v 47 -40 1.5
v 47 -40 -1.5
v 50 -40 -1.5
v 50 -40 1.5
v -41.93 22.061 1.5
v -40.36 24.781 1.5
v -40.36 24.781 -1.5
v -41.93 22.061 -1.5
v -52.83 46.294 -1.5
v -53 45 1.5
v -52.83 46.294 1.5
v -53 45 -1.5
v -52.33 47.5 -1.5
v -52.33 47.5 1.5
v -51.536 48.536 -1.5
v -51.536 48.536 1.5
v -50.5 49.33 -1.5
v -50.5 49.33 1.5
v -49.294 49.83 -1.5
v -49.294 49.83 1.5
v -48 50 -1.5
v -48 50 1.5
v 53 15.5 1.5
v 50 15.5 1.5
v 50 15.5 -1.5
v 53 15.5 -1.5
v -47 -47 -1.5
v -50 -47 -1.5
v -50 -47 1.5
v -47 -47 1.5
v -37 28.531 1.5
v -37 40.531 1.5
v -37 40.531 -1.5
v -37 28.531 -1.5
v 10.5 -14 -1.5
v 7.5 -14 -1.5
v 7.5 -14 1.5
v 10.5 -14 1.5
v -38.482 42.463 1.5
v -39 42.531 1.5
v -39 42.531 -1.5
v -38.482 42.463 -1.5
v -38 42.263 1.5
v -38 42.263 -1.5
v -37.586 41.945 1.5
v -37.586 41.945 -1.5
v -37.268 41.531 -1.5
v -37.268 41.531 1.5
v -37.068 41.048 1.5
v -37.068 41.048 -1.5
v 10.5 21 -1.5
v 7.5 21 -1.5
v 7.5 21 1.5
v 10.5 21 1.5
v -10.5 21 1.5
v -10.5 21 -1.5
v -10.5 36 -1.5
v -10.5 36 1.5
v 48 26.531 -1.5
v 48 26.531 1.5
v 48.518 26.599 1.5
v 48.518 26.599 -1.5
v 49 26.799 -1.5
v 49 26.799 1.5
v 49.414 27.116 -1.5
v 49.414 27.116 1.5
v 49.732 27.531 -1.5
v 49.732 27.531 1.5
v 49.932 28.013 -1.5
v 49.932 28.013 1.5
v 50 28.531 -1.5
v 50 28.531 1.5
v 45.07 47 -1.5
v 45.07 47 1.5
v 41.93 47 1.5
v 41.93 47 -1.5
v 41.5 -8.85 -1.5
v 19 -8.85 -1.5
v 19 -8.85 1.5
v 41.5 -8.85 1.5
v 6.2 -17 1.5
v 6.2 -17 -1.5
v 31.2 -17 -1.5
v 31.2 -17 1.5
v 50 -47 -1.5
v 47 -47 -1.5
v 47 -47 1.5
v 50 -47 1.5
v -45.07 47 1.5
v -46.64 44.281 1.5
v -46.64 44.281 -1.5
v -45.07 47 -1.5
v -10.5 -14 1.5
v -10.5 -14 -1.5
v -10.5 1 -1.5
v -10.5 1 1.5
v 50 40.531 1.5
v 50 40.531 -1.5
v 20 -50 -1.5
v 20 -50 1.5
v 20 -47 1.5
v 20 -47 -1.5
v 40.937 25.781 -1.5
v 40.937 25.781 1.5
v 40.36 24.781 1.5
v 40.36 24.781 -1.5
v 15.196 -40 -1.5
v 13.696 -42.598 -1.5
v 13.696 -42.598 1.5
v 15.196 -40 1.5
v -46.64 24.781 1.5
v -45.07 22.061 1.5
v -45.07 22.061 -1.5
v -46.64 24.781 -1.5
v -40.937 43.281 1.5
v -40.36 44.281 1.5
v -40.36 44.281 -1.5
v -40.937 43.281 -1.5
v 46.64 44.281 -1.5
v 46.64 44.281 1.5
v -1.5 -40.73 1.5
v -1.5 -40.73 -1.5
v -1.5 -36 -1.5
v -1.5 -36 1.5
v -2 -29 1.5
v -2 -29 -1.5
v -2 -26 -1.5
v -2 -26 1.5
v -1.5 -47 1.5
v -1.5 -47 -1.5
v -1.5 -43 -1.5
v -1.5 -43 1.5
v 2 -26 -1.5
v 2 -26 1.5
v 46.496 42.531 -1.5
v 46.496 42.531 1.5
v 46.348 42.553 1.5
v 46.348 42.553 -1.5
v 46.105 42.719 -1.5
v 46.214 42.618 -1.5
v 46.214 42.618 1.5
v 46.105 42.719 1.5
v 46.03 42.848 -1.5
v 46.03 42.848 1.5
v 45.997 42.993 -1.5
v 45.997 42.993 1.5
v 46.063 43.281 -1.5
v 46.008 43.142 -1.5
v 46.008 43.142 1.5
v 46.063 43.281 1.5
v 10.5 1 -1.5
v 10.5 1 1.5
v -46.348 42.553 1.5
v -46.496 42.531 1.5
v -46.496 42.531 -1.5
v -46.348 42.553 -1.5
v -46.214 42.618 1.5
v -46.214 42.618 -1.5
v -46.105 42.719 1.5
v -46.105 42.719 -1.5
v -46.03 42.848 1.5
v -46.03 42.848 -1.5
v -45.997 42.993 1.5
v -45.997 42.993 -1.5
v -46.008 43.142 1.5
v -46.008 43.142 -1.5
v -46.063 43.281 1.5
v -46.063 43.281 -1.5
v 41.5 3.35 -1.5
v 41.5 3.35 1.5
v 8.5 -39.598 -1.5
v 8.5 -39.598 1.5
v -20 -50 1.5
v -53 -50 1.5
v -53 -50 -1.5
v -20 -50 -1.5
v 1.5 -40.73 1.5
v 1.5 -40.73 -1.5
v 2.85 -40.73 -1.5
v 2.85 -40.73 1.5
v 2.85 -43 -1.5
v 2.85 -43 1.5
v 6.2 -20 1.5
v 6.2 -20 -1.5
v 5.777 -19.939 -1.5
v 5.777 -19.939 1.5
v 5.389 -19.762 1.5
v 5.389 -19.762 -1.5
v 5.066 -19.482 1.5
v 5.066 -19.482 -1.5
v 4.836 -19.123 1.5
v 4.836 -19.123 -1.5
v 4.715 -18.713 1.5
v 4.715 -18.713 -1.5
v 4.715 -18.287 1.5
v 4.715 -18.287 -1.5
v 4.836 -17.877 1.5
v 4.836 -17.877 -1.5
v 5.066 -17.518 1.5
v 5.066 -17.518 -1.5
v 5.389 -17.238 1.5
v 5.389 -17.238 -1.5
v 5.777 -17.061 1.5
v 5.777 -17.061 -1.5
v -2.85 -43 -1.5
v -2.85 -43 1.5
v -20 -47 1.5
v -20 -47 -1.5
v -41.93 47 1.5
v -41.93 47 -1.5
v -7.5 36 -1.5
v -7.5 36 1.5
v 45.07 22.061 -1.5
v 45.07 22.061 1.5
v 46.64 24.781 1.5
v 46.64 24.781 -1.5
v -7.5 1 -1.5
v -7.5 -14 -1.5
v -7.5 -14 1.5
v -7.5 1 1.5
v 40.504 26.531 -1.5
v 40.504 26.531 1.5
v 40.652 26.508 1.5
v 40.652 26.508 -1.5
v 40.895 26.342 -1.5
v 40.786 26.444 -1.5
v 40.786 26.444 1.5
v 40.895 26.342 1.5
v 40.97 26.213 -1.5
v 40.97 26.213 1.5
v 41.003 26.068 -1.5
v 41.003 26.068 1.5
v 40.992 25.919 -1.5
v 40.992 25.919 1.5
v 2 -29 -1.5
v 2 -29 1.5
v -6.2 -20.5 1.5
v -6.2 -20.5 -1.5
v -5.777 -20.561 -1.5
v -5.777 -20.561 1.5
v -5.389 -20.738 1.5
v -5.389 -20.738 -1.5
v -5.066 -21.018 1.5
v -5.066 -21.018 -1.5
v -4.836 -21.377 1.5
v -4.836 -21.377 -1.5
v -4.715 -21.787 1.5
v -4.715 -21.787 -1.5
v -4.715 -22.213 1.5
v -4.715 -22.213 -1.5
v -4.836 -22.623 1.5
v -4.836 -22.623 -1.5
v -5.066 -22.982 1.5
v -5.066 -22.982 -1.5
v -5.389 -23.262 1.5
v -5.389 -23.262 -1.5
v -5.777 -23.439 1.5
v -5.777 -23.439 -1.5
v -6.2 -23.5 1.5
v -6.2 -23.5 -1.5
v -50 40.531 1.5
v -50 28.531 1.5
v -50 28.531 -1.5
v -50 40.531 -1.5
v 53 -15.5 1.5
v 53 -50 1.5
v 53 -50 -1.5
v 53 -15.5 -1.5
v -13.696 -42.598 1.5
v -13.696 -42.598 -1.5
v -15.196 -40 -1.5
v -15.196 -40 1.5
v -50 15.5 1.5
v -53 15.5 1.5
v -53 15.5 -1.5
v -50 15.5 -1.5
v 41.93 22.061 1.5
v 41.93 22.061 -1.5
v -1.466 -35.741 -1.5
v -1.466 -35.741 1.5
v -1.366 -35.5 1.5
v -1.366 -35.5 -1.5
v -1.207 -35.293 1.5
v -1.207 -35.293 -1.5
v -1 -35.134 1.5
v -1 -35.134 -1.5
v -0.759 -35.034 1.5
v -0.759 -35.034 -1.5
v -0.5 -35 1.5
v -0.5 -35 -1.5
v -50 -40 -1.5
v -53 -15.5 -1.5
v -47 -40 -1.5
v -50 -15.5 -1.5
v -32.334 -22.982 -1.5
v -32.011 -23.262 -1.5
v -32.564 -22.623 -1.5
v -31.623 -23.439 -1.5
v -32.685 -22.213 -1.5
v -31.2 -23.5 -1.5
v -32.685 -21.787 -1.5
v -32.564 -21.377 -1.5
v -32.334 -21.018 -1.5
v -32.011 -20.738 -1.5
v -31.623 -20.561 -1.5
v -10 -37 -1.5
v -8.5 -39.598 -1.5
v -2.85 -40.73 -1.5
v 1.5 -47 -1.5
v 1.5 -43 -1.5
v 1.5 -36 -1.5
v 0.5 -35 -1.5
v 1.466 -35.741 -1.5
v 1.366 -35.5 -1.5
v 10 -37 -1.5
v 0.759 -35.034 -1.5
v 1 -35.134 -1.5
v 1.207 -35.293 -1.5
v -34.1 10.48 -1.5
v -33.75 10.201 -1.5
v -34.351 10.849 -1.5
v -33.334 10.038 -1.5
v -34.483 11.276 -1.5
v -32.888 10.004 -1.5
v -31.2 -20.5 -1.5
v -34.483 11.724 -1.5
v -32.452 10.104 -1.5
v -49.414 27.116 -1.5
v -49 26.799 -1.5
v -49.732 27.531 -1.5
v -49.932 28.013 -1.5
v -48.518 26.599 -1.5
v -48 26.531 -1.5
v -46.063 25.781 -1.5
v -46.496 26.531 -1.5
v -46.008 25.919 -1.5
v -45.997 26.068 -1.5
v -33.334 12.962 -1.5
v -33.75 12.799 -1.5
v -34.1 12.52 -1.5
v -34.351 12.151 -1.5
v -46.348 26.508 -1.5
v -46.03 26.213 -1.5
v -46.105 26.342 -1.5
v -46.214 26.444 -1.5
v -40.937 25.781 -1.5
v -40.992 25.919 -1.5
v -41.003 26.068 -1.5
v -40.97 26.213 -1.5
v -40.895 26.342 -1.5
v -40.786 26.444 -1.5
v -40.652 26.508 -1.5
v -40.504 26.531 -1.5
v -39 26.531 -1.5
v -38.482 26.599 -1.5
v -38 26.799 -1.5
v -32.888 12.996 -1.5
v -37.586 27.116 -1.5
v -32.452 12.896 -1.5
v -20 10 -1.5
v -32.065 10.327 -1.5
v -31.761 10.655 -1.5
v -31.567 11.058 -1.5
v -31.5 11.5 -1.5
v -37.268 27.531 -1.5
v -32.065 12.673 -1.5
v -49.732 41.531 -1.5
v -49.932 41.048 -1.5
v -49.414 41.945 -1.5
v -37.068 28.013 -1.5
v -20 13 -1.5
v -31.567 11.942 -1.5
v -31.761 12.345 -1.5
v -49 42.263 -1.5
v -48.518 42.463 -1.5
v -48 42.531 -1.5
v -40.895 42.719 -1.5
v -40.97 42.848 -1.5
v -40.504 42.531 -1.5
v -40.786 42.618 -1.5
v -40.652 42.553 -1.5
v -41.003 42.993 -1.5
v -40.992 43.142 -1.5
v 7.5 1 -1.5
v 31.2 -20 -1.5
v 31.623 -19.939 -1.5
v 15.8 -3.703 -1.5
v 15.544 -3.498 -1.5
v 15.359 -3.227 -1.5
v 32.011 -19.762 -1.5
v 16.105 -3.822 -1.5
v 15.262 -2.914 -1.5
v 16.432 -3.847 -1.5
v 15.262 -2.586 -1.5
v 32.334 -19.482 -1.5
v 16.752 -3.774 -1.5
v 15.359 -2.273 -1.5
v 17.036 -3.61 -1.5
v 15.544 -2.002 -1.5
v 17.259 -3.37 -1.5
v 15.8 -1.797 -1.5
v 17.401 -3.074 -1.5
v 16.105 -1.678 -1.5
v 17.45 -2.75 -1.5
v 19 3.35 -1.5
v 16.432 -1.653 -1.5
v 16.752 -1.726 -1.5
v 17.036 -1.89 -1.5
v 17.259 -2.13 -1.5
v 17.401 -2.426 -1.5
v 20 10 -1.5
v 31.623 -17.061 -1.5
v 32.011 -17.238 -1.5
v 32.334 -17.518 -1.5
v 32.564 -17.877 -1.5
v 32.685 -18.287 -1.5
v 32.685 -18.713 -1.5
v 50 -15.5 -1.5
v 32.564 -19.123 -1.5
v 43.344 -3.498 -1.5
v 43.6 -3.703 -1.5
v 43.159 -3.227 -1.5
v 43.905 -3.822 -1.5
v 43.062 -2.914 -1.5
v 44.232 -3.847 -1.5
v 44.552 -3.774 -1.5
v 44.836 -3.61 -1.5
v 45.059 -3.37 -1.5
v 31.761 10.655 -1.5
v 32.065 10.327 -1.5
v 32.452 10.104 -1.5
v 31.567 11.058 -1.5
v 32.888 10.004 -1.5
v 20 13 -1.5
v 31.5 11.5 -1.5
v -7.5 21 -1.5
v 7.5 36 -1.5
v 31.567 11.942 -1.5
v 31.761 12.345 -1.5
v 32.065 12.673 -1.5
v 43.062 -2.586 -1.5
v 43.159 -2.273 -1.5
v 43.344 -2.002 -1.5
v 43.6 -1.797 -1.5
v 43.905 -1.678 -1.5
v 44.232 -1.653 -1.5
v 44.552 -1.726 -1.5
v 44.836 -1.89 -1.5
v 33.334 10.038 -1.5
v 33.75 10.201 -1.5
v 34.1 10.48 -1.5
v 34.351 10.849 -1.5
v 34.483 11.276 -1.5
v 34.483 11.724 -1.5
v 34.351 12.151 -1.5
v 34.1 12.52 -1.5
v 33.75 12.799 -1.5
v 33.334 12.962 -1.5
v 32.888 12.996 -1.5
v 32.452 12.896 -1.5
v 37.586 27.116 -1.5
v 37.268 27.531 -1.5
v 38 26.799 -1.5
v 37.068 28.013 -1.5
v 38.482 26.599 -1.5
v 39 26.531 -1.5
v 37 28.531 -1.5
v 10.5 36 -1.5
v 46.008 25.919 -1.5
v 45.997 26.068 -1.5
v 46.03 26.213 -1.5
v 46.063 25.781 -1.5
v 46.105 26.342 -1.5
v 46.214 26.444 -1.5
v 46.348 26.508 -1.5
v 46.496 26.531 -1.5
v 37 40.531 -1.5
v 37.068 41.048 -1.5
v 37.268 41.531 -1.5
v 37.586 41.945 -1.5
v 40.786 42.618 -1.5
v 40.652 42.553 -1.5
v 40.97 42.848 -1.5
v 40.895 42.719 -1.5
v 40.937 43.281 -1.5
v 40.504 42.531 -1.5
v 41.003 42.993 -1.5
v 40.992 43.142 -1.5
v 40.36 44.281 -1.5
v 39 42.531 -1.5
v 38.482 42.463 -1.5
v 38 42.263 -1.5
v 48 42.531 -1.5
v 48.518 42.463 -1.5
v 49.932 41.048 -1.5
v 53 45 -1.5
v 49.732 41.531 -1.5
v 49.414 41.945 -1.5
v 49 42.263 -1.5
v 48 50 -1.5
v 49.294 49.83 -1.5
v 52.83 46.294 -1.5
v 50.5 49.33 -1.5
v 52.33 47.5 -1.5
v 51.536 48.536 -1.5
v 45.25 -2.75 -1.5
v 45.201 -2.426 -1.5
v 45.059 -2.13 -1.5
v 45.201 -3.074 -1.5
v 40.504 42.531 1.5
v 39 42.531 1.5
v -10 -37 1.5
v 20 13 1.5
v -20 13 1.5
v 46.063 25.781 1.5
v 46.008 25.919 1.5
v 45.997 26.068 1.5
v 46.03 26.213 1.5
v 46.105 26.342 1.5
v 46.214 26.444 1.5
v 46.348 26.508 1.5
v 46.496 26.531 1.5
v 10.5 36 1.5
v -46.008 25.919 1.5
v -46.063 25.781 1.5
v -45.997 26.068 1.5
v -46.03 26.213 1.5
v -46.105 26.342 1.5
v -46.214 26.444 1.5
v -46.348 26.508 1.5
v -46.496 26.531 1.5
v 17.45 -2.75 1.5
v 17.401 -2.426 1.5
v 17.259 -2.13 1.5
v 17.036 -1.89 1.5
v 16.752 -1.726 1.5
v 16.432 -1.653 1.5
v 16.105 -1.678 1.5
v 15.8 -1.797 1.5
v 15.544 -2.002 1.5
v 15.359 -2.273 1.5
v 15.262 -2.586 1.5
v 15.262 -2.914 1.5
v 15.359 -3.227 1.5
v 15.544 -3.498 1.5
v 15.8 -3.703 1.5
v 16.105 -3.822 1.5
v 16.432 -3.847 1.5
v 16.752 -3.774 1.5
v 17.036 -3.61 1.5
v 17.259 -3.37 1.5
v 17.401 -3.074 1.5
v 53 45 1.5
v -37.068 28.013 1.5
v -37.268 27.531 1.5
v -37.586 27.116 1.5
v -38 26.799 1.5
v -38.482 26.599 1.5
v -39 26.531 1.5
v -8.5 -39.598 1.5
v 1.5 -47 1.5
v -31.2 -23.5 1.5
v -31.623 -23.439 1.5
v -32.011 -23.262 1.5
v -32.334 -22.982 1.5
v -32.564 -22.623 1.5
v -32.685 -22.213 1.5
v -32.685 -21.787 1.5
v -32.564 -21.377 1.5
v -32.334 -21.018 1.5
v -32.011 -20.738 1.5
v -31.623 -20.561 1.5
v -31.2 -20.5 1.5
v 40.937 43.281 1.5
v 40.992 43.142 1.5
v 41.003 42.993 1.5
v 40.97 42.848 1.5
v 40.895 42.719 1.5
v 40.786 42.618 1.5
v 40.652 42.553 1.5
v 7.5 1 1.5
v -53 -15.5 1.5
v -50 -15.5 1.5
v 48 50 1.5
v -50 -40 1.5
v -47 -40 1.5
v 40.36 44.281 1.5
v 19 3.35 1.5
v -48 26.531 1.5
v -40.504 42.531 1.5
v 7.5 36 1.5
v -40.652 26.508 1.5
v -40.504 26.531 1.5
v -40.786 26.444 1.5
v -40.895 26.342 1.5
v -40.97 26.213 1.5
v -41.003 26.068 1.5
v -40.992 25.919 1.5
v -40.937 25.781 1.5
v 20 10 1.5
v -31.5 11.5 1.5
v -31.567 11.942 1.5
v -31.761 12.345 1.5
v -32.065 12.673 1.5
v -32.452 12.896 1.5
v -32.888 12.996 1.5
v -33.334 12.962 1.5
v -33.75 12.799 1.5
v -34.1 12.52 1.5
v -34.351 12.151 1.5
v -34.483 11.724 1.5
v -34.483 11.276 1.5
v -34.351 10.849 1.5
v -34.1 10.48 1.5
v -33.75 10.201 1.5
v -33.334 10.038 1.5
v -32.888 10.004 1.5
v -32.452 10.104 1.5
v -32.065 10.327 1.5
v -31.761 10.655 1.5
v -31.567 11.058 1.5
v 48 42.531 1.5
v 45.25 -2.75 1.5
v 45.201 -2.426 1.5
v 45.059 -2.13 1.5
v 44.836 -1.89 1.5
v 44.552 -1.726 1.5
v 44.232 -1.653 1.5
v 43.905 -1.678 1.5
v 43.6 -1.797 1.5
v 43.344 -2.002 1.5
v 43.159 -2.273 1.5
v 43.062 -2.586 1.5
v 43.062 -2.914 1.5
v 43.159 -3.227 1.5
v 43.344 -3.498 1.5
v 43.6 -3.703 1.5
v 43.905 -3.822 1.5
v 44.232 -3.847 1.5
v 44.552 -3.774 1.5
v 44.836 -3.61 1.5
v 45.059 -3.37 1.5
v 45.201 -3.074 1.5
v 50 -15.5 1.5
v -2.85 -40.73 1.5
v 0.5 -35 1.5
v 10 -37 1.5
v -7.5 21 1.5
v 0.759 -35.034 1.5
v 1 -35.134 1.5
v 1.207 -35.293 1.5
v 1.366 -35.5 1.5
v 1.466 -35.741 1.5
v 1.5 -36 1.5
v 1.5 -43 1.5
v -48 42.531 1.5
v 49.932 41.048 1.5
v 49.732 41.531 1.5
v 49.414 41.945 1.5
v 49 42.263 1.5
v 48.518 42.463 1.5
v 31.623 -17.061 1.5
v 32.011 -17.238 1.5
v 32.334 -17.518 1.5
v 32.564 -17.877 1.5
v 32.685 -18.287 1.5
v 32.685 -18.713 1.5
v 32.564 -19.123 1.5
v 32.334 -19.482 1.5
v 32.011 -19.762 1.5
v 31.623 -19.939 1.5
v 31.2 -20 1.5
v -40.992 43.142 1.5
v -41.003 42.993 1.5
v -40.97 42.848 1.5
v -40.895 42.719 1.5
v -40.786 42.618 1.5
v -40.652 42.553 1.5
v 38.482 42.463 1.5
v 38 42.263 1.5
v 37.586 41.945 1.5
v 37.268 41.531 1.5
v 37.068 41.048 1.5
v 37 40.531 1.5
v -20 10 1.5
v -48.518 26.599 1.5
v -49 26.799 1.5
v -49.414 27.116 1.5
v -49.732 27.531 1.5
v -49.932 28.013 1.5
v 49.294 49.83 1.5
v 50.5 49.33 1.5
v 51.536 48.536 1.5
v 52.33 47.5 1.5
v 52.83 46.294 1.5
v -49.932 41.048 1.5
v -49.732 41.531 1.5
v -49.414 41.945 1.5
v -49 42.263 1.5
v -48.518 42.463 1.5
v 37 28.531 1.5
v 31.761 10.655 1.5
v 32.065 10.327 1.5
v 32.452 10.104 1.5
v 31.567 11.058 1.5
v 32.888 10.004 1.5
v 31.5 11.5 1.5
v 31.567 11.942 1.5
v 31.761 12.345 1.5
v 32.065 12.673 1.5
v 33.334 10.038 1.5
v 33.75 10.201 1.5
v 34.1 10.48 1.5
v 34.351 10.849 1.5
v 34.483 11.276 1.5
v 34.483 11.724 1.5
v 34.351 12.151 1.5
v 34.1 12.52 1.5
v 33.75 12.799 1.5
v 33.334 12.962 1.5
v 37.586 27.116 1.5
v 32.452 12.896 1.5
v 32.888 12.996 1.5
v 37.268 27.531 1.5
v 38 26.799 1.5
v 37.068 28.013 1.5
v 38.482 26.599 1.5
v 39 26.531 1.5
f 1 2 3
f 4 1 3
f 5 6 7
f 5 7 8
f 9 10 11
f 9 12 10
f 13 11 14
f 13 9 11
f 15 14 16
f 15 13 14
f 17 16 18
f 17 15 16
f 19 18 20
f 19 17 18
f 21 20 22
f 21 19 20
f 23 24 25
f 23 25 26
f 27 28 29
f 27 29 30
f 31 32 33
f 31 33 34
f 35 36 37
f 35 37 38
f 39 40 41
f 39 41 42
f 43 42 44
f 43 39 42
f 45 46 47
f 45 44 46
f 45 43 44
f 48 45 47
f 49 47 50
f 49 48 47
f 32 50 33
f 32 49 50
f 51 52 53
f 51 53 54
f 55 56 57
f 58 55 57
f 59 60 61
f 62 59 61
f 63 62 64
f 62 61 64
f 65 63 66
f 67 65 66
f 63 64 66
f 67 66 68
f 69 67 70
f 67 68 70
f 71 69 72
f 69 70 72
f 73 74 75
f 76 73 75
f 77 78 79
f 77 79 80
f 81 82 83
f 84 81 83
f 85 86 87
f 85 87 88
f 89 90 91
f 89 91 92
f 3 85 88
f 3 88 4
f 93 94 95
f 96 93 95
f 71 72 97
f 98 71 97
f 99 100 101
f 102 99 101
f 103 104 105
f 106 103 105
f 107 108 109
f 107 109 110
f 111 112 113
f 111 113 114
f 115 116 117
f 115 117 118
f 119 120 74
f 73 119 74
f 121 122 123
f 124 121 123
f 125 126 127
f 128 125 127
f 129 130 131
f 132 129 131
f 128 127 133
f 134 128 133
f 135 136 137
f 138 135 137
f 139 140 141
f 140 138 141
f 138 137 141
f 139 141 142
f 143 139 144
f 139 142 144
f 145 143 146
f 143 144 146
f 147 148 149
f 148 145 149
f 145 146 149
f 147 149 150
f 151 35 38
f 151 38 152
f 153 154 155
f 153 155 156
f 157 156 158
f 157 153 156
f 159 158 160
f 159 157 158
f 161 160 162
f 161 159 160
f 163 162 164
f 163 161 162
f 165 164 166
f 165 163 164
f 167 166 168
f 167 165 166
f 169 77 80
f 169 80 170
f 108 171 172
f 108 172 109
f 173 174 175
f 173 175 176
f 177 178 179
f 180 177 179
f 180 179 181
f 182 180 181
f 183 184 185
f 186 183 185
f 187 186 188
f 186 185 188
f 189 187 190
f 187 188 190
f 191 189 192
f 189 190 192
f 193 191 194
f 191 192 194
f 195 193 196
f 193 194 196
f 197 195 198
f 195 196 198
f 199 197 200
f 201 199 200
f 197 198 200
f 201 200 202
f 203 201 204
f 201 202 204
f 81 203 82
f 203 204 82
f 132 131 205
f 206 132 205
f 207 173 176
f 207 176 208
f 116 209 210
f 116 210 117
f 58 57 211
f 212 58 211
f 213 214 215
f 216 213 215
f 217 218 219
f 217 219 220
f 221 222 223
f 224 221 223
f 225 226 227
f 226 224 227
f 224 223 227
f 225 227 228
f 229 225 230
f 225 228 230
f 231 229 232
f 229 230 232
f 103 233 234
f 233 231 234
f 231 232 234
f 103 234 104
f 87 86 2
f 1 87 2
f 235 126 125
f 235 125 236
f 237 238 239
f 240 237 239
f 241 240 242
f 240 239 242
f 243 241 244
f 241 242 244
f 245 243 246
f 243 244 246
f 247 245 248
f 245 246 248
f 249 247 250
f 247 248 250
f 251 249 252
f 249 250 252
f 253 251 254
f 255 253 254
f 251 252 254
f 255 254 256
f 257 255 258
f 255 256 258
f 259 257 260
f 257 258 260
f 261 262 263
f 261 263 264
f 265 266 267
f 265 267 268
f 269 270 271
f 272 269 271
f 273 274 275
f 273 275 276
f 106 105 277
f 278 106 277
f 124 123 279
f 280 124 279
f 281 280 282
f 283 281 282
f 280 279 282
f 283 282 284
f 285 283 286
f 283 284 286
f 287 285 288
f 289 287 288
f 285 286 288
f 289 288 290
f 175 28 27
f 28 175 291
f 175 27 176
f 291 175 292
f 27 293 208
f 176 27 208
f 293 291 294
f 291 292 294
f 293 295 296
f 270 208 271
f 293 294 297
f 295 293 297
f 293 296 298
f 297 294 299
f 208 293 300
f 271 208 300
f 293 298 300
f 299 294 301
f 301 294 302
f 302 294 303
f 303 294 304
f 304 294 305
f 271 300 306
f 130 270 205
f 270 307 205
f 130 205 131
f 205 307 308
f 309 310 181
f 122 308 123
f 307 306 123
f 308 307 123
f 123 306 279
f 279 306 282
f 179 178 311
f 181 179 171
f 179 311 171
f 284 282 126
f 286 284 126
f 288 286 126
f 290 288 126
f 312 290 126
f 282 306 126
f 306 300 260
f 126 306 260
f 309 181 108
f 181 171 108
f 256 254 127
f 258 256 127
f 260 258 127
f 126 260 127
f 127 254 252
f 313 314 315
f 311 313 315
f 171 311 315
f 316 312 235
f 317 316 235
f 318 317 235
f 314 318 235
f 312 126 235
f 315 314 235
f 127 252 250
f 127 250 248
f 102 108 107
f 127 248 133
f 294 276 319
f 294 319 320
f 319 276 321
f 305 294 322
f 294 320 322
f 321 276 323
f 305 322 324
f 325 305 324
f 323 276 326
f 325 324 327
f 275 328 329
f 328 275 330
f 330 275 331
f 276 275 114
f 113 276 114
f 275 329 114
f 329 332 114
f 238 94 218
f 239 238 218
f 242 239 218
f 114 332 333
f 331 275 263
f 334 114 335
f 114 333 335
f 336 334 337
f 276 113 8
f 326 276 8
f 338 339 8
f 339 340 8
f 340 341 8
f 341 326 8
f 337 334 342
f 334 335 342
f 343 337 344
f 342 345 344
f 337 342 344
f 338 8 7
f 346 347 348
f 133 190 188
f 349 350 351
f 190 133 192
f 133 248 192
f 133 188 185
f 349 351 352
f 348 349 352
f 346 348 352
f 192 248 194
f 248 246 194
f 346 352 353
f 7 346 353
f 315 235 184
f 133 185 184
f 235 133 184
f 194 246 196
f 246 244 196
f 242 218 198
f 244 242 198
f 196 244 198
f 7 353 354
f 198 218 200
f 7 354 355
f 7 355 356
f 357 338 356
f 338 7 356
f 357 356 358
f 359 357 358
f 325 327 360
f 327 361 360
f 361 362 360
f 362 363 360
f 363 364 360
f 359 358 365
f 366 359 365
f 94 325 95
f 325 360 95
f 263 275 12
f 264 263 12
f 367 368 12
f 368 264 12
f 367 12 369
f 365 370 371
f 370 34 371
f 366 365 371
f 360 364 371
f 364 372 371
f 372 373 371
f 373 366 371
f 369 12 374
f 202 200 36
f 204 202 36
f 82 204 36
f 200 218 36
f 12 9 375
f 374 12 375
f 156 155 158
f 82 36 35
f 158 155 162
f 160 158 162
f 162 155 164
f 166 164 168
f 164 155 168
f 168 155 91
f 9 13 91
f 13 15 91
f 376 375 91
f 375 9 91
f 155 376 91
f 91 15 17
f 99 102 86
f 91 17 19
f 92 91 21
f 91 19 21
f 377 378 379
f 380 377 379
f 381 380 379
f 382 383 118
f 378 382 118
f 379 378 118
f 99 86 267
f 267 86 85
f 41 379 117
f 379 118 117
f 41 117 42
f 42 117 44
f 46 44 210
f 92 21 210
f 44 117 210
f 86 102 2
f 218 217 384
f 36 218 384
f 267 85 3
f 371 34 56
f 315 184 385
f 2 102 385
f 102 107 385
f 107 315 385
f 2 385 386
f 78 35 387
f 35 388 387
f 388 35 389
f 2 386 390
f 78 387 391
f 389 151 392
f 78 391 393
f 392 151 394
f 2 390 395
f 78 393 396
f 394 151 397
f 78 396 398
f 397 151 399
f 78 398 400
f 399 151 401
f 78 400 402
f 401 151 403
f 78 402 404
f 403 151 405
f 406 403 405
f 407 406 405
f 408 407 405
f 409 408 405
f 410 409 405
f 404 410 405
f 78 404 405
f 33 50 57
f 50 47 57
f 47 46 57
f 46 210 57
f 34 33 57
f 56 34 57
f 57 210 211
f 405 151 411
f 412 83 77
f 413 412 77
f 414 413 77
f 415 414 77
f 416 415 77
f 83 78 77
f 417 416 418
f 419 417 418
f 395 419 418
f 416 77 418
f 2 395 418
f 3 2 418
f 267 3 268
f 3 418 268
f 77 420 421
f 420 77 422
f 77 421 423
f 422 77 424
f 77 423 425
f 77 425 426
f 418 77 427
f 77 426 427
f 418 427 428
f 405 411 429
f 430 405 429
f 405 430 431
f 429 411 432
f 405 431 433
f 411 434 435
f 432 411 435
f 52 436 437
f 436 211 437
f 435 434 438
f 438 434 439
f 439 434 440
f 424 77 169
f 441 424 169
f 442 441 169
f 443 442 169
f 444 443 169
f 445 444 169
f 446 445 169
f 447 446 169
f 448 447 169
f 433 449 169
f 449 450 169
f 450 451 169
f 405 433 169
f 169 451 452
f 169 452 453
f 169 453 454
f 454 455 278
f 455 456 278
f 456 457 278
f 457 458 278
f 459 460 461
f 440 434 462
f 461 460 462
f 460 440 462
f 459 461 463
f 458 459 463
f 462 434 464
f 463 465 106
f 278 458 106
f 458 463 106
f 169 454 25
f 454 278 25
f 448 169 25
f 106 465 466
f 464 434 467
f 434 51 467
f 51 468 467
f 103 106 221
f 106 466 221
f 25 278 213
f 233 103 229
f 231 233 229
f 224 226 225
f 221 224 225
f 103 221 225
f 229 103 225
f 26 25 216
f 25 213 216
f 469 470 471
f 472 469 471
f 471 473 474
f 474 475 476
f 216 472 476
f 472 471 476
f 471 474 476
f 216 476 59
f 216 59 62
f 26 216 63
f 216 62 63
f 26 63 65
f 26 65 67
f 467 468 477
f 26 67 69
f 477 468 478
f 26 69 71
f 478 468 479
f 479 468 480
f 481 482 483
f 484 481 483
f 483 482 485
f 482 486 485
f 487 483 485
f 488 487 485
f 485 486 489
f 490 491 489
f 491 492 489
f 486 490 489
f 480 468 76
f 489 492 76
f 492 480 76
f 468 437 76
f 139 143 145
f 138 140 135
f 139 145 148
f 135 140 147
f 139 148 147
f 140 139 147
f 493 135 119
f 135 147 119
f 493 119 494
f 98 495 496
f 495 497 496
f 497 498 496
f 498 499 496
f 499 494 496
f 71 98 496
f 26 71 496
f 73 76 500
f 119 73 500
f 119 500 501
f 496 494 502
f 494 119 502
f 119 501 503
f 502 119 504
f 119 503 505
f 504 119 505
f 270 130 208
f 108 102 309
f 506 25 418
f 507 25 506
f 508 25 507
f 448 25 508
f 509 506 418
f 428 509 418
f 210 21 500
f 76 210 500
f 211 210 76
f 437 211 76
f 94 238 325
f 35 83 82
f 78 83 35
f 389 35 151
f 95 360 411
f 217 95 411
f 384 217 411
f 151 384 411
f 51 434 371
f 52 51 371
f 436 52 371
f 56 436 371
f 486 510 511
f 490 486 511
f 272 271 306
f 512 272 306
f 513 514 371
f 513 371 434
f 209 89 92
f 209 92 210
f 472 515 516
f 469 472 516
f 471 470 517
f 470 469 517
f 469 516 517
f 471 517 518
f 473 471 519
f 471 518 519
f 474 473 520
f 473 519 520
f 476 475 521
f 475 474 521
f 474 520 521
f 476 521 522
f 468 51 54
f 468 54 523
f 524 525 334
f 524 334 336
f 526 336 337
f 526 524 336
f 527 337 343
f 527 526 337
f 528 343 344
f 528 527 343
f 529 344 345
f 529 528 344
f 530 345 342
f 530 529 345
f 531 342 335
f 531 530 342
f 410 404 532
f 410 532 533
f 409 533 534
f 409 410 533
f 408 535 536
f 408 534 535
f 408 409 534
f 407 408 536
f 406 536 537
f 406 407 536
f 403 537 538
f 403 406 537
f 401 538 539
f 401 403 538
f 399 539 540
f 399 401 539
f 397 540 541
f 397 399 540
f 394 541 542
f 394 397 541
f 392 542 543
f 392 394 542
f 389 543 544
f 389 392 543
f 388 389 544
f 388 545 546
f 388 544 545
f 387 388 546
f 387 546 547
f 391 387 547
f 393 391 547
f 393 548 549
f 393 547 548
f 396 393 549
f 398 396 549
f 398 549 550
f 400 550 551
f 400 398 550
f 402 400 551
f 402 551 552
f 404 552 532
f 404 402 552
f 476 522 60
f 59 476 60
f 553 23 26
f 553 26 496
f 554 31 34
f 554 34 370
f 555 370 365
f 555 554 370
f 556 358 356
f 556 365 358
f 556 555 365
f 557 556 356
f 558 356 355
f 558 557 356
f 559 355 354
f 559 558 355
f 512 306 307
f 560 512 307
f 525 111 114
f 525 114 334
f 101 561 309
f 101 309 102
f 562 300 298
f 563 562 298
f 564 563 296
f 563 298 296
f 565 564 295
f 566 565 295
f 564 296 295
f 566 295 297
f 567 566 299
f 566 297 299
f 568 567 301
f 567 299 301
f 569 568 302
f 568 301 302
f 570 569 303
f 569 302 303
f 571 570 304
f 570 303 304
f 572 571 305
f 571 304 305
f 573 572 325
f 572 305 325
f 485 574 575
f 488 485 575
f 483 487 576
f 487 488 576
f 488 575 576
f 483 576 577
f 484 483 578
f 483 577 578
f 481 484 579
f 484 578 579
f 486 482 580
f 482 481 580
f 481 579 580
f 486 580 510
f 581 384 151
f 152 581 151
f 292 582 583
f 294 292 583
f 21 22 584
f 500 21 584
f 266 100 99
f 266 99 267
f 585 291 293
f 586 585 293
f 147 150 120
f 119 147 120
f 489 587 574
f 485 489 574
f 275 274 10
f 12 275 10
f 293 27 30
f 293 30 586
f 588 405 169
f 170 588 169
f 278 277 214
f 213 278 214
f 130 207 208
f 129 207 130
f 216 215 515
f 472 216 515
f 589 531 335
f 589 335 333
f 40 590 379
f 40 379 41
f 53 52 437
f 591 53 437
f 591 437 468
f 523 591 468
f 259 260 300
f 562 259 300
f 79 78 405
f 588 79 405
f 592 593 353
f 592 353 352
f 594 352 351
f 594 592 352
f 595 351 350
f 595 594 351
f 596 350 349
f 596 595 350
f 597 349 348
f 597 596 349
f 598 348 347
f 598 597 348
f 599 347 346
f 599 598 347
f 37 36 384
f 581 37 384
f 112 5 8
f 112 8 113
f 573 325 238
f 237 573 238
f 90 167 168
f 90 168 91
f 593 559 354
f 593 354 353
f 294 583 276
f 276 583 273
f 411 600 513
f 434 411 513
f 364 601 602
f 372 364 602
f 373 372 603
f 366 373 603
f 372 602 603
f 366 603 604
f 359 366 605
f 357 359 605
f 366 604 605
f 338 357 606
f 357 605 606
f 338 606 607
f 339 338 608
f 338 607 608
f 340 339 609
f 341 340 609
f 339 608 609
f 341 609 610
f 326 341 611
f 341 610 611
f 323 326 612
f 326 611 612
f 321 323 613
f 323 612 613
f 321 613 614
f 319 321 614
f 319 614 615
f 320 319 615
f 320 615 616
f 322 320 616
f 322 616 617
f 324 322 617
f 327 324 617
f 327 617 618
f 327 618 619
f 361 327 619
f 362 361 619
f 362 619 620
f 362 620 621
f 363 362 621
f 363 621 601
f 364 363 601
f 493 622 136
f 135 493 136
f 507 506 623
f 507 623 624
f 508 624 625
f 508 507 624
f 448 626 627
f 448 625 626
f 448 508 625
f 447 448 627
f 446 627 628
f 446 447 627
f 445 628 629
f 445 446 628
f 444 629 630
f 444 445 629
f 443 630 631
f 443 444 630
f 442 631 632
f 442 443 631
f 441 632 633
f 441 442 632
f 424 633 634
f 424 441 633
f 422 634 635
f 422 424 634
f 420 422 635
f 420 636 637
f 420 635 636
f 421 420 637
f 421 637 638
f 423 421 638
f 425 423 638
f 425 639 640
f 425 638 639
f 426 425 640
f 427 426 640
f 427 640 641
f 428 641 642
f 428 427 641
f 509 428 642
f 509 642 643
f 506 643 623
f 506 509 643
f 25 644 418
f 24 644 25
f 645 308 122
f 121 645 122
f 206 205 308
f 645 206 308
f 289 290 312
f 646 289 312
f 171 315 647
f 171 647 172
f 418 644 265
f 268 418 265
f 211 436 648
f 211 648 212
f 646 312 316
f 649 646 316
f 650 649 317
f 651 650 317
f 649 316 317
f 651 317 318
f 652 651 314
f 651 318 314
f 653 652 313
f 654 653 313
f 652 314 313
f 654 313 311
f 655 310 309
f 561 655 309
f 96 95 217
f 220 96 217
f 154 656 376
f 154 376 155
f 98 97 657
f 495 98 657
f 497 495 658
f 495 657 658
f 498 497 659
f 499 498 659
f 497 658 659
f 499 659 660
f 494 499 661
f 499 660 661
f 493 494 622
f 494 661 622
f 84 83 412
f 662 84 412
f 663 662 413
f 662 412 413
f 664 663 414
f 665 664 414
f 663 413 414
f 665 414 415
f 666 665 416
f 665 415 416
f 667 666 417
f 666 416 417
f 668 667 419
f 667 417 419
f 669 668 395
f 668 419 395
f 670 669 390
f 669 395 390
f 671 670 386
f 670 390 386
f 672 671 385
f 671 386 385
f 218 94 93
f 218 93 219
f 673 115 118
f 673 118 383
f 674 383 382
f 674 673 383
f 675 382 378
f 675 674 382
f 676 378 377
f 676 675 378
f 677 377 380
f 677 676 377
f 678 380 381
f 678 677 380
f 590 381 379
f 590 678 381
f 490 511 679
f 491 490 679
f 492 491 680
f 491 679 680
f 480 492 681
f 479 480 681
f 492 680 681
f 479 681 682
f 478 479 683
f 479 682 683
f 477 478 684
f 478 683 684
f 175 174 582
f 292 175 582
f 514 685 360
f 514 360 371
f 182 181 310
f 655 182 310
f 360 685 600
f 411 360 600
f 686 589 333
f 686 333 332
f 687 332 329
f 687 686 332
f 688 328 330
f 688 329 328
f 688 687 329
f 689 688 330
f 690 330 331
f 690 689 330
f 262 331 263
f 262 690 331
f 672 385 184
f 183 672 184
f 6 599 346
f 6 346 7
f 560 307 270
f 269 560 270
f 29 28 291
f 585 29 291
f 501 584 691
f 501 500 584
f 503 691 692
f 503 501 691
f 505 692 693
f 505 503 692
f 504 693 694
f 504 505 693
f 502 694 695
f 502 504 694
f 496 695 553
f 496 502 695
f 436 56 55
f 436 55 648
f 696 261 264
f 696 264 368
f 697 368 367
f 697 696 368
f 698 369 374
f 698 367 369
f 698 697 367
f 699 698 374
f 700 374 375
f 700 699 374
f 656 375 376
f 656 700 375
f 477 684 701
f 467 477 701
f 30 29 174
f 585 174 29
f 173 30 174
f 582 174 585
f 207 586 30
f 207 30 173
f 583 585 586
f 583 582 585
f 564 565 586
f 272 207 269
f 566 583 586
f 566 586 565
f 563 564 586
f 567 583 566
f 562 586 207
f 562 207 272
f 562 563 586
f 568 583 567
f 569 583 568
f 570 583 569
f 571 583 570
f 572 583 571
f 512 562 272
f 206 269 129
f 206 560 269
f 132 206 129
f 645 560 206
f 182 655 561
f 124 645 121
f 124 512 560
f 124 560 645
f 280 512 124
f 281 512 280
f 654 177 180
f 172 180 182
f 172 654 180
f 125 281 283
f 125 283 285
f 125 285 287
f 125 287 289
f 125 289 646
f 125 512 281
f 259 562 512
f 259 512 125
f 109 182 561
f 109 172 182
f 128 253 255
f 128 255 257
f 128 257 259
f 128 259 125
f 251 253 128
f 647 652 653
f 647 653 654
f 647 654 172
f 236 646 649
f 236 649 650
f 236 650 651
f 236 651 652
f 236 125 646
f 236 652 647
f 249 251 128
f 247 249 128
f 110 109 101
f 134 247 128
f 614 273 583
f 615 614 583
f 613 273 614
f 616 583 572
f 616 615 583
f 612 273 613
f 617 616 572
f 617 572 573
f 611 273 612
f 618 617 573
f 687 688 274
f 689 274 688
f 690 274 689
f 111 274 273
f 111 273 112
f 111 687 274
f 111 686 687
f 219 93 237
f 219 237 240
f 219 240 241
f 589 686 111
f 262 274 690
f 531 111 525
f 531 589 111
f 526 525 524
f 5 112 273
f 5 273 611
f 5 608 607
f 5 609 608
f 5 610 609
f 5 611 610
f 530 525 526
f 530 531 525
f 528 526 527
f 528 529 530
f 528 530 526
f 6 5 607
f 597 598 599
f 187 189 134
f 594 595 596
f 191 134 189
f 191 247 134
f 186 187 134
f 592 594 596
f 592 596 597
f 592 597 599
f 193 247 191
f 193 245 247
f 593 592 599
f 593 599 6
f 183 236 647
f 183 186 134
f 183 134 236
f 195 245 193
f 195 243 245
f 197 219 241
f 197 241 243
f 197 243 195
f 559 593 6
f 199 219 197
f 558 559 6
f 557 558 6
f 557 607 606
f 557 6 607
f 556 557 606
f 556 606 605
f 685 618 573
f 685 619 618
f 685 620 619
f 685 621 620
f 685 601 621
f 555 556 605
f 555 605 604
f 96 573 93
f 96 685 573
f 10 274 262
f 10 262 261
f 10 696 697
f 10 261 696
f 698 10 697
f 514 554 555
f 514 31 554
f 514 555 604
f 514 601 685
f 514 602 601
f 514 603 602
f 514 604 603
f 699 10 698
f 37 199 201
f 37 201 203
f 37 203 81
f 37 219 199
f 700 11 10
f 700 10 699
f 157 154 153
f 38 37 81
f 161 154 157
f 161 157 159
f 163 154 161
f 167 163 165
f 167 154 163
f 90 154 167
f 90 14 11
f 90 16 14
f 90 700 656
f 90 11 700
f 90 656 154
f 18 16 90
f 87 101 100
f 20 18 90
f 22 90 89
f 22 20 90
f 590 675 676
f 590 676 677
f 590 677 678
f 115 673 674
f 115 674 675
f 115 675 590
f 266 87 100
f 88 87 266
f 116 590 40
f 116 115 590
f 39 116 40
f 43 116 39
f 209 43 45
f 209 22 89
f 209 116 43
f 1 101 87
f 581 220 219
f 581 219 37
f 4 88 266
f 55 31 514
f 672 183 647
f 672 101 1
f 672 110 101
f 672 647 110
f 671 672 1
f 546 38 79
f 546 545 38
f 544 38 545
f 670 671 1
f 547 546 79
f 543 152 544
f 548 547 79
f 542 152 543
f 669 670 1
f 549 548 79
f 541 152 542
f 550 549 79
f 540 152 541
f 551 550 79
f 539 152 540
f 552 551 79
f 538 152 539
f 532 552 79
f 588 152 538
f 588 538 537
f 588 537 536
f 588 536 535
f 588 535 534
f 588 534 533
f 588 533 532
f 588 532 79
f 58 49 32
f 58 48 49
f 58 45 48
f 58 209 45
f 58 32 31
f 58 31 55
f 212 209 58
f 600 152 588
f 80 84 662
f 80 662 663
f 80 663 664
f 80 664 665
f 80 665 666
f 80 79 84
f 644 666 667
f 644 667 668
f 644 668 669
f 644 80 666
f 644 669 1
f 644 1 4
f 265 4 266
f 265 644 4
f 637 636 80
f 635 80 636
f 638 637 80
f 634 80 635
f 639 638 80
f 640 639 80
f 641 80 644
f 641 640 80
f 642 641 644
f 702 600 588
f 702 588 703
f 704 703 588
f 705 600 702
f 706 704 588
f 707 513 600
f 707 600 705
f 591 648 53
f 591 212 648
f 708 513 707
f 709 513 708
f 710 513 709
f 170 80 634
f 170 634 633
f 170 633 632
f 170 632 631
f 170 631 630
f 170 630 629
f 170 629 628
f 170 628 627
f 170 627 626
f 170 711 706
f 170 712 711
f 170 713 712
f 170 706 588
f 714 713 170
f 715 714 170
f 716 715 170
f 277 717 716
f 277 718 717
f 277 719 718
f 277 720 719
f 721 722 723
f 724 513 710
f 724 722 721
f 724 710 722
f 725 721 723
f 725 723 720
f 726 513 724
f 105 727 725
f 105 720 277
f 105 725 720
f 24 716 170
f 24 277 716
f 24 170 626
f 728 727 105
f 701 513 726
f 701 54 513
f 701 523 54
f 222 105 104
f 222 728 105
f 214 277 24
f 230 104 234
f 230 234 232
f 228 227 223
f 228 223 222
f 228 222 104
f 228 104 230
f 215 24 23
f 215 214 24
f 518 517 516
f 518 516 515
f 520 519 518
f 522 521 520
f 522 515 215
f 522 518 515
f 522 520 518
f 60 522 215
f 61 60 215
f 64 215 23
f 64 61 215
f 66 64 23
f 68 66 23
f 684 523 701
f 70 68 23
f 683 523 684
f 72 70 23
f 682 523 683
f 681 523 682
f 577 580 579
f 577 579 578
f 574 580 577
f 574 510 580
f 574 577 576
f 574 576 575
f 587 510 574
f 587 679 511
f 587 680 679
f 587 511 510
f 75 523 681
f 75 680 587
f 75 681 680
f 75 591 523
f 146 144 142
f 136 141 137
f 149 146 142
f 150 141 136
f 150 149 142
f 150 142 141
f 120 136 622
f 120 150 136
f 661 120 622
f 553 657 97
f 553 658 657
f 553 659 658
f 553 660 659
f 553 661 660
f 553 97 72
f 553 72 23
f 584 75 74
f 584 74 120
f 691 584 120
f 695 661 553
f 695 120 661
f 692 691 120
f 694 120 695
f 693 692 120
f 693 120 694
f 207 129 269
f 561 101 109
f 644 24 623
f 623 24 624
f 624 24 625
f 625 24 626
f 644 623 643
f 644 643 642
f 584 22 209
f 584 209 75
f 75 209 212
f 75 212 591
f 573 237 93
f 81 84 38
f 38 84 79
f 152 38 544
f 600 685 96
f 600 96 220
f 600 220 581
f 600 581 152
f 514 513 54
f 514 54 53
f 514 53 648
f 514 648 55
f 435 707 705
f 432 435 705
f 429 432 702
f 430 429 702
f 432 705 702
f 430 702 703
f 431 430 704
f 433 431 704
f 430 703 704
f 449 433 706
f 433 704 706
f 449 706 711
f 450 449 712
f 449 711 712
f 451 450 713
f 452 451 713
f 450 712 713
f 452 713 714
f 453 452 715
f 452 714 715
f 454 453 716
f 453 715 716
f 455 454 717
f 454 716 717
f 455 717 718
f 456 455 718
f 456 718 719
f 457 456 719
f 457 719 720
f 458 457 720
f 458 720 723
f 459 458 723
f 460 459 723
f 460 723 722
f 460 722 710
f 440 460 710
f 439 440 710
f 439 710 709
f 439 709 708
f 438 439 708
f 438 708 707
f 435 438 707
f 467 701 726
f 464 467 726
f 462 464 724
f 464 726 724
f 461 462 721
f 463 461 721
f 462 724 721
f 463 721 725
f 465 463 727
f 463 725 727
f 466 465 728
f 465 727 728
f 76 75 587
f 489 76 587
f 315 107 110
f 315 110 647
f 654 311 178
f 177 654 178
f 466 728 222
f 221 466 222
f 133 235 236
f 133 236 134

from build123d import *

# Parameters (mm, degrees)
ESBO_O1_W                  = 100
ESBO_O1_H                  = 100
RESSALTO_EXTRUS_O1_DEPTH   = 1.5
ESBO_O2_R                  = 1.5
ESBO_O2_W                  = 40
ESBO_O2_H                  = 3
CORTE_EXTRUS_O1_DEPTH      = 71.774289117
ESBO_O3_W                  = 3
ESBO_O3_H                  = 34.5
RESSALTO_EXTRUS_O2_DEPTH   = 3
CUT_EXTRUDE4_DEPTH         = 73.878323252
CUT_EXTRUDE4_DEPTH_BACK    = 73.878323252
FILLET1_R                  = 5
CUT_EXTRUDE5_DEPTH         = 73.878323252
CUT_EXTRUDE5_DEPTH_BACK    = 73.878323252
SKETCH3_W                  = 3
SKETCH3_H                  = 15
SKETCH3_W_2                = 4
SKETCH3_H_2                = 3
SKETCH3_H_3                = 7
CORTE_GY_VL53L0_DEPTH      = 73.924618614
CORTE_GY_VL53L0_DEPTH_BACK = 73.924618614
CUT_EXTRUDE6_DEPTH         = 73.924618614
CUT_EXTRUDE6_DEPTH_BACK    = 73.924618614
SKETCH4_R                  = 1.1
SKETCH4_W                  = 22.5
SKETCH4_H                  = 12.2
CUT_EXTRUDE7_DEPTH         = 73.924618614
CUT_EXTRUDE7_DEPTH_BACK    = 73.924618614


with BuildPart() as part:
    # Esboço1 → Ressalto-extrusão1 (new, symmetric)
    with BuildSketch(Plane.XY):
        Rectangle(ESBO_O1_W, ESBO_O1_H)
    extrude(amount=RESSALTO_EXTRUS_O1_DEPTH, both=True)

    # Esboço2 → Corte-extrusão1 (cut, through all)
    with BuildSketch(Plane.XY.offset(1.5)):
        with Locations((-33, 11.5)):
            Circle(ESBO_O2_R)
        with Locations(Location((33, 11.5, 0), (0, 0, 180))):
            Circle(ESBO_O2_R)
        with Locations((0, -48.5)):
            Rectangle(ESBO_O2_W, ESBO_O2_H)
        with Locations((0, 11.5)):
            Rectangle(ESBO_O2_W, ESBO_O2_H)
    extrude(amount=-CORTE_EXTRUS_O1_DEPTH, mode=Mode.SUBTRACT)

    # Esboço3 → Ressalto-extrusão2 (add, through all)
    with BuildSketch(Plane.XY.offset(1.5)):
        with Locations((-51.5, -32.75)):
            Rectangle(ESBO_O3_W, ESBO_O3_H)
        with Locations((51.5, -32.75)):
            Rectangle(ESBO_O3_W, ESBO_O3_H)
        with Locations((-51.5, 32.75)):
            Rectangle(ESBO_O3_W, ESBO_O3_H)
        with Locations((51.5, 32.75)):
            Rectangle(ESBO_O3_W, ESBO_O3_H)
    extrude(amount=-RESSALTO_EXTRUS_O2_DEPTH)

    # Sketch2 → Cut-Extrude4 (cut, two sides: drawn at the far end of the back side and taken through both)
    with BuildSketch(Plane.XY.offset(-CUT_EXTRUDE4_DEPTH_BACK)):
        with BuildLine():
            Line((-0.5, -35), (0.5, -35))
            ThreePointArc((0.5, -35), (1.207106781, -35.292893219), (1.5, -36))
            Line((1.5, -36), (1.5, -40.73))
            Line((1.5, -40.73), (2.85, -40.73))
            Line((2.85, -40.73), (2.85, -43))
            Line((2.85, -43), (1.5, -43))
            Line((1.5, -43), (1.5, -47))
            Line((1.5, -47), (-1.5, -47))
            Line((-1.5, -47), (-1.5, -43))
            Line((-1.5, -43), (-2.85, -43))
            Line((-2.85, -43), (-2.85, -40.73))
            Line((-2.85, -40.73), (-1.5, -40.73))
            Line((-1.5, -40.73), (-1.5, -36))
            ThreePointArc((-1.5, -36), (-1.207106781, -35.292893219), (-0.5, -35))
        make_face()
    extrude(amount=CUT_EXTRUDE4_DEPTH + CUT_EXTRUDE4_DEPTH_BACK, mode=Mode.SUBTRACT)

    # Fillet1
    fillet1_edges = [part.edges().sort_by_distance(p)[0] for p in [
        (53, 50, 0),
        (-53, 50, 0),
    ]]
    fillet(fillet1_edges, radius=FILLET1_R)

    # Sketch3 → Cut-Extrude5 (cut, two sides: drawn at the far end of the back side and taken through both)
    with BuildSketch(Plane.XY.offset(-CUT_EXTRUDE5_DEPTH_BACK)):
        with Locations((9, -6.5)):
            Rectangle(SKETCH3_W, SKETCH3_H)
        with Locations((9, 28.5)):
            Rectangle(SKETCH3_W, SKETCH3_H)
        with Locations((-9, 28.5)):
            Rectangle(SKETCH3_W, SKETCH3_H)
        with Locations((-9, -6.5)):
            Rectangle(SKETCH3_W, SKETCH3_H)
        with Locations((0, -27.5)):
            Rectangle(SKETCH3_W_2, SKETCH3_H_2)
        Polygon((-15.196152423, -40), (-10, -37), (-8.5, -39.598076211), (-13.696152423, -42.598076211), align=None)
        Polygon((10, -37), (8.5, -39.598076211), (13.696152423, -42.598076211), (15.196152423, -40), align=None)
        with Locations((-48.5, -43.5)):
            Rectangle(SKETCH3_W, SKETCH3_H_3)
        with Locations((48.5, -43.5)):
            Rectangle(SKETCH3_W, SKETCH3_H_3)
    extrude(amount=CUT_EXTRUDE5_DEPTH + CUT_EXTRUDE5_DEPTH_BACK, mode=Mode.SUBTRACT)

    # Sketch1 → Corte Gy-VL53L0 (cut, two sides: drawn at the far end of the back side and taken through both)
    with BuildSketch(Plane(origin=(0, 0, -1.5), x_dir=(-1, 0, 0), z_dir=(0, 0, -1)).offset(-CORTE_GY_VL53L0_DEPTH_BACK)):
        with BuildLine():
            Line((-46.5, 42.530680232), (-46.495662433, 42.530680232))
            ThreePointArc((-46.495662433, 42.530680232), (-46.062649731, 42.780680232), (-46.062649731, 43.280680232))
            Line((-46.062649731, 43.280680232), (-46.64, 44.280680232))
            Line((-46.64, 44.280680232), (-45.07, 47))
            Line((-45.07, 47), (-41.93, 47))
            Line((-41.93, 47), (-40.36, 44.280680232))
            Line((-40.36, 44.280680232), (-40.937350269, 43.280680232))
            ThreePointArc((-40.937350269, 43.280680232), (-40.937350269, 42.780680232), (-40.504337567, 42.530680232))
            Line((-40.504337567, 42.530680232), (-39, 42.530680232))
            ThreePointArc((-39, 42.530680232), (-37.585786438, 41.944893794), (-37, 40.530680232))
            Line((-37, 40.530680232), (-37, 28.530680232))
            ThreePointArc((-37, 28.530680232), (-37.585786438, 27.11646667), (-39, 26.530680232))
            Line((-39, 26.530680232), (-40.504337567, 26.530680232))
            ThreePointArc((-40.504337567, 26.530680232), (-40.937350269, 26.280680232), (-40.937350269, 25.780680232))
            Line((-40.937350269, 25.780680232), (-40.36, 24.780680232))
            Line((-40.36, 24.780680232), (-41.93, 22.061360464))
            Line((-41.93, 22.061360464), (-45.07, 22.061360464))
            Line((-45.07, 22.061360464), (-46.64, 24.780680232))
            Line((-46.64, 24.780680232), (-46.062649731, 25.780680232))
            ThreePointArc((-46.062649731, 25.780680232), (-46.062649731, 26.280680232), (-46.495662433, 26.530680232))
            Line((-46.495662433, 26.530680232), (-48, 26.530680232))
            ThreePointArc((-48, 26.530680232), (-49.414213562, 27.11646667), (-50, 28.530680232))
            Line((-50, 28.530680232), (-50, 34.530680232))
            Line((-50, 34.530680232), (-50, 40.530680232))
            ThreePointArc((-50, 40.530680232), (-49.414213562, 41.944893794), (-48, 42.530680232))
            Line((-48, 42.530680232), (-46.5, 42.530680232))
        make_face()
        with BuildLine():
            Line((46.5, 42.530680232), (46.495662433, 42.530680232))
            ThreePointArc((46.495662433, 42.530680232), (46.062649731, 42.780680232), (46.062649731, 43.280680232))
            Line((46.062649731, 43.280680232), (46.64, 44.280680232))
            Line((46.64, 44.280680232), (45.07, 47))
            Line((45.07, 47), (41.93, 47))
            Line((41.93, 47), (40.36, 44.280680232))
            Line((40.36, 44.280680232), (40.937350269, 43.280680232))
            ThreePointArc((40.937350269, 43.280680232), (40.937350269, 42.780680232), (40.504337567, 42.530680232))
            Line((40.504337567, 42.530680232), (39, 42.530680232))
            ThreePointArc((39, 42.530680232), (37.585786438, 41.944893794), (37, 40.530680232))
            Line((37, 40.530680232), (37, 28.530680232))
            ThreePointArc((37, 28.530680232), (37.585786438, 27.11646667), (39, 26.530680232))
            Line((39, 26.530680232), (40.504337567, 26.530680232))
            ThreePointArc((40.504337567, 26.530680232), (40.937350269, 26.280680232), (40.937350269, 25.780680232))
            Line((40.937350269, 25.780680232), (40.36, 24.780680232))
            Line((40.36, 24.780680232), (41.93, 22.061360464))
            Line((41.93, 22.061360464), (45.07, 22.061360464))
            Line((45.07, 22.061360464), (46.64, 24.780680232))
            Line((46.64, 24.780680232), (46.062649731, 25.780680232))
            ThreePointArc((46.062649731, 25.780680232), (46.062649731, 26.280680232), (46.495662433, 26.530680232))
            Line((46.495662433, 26.530680232), (48, 26.530680232))
            ThreePointArc((48, 26.530680232), (49.414213562, 27.11646667), (50, 28.530680232))
            Line((50, 28.530680232), (50, 34.530680232))
            Line((50, 34.530680232), (50, 40.530680232))
            ThreePointArc((50, 40.530680232), (49.414213562, 41.944893794), (48, 42.530680232))
            Line((48, 42.530680232), (46.5, 42.530680232))
        make_face()
    extrude(amount=CORTE_GY_VL53L0_DEPTH + CORTE_GY_VL53L0_DEPTH_BACK, mode=Mode.SUBTRACT)

    # Sketch4 → Cut-Extrude6 (cut, two sides: drawn at the far end of the back side and taken through both)
    with BuildSketch(Plane.XY.offset(1.5).offset(-CUT_EXTRUDE6_DEPTH_BACK)):
        with Locations((44.15, -2.75)):
            Circle(SKETCH4_R)
        with Locations((16.35, -2.75)):
            Circle(SKETCH4_R)
        with Locations((30.25, -2.75)):
            Rectangle(SKETCH4_W, SKETCH4_H)
    extrude(amount=CUT_EXTRUDE6_DEPTH + CUT_EXTRUDE6_DEPTH_BACK, mode=Mode.SUBTRACT)

    # Sketch6 → Cut-Extrude7 (cut, two sides: drawn at the far end of the back side and taken through both)
    with BuildSketch(Plane.XY.offset(1.5).offset(-CUT_EXTRUDE7_DEPTH_BACK)):
        with BuildLine():
            Line((-31.2, -20.5), (-6.2, -20.5))
            ThreePointArc((-6.2, -20.5), (-4.7, -22), (-6.2, -23.5))
            Line((-6.2, -23.5), (-31.2, -23.5))
            ThreePointArc((-31.2, -23.5), (-32.7, -22), (-31.2, -20.5))
        make_face()
        with BuildLine():
            Line((6.2, -17), (31.2, -17))
            ThreePointArc((31.2, -17), (32.7, -18.5), (31.2, -20))
            Line((31.2, -20), (6.2, -20))
            ThreePointArc((6.2, -20), (4.7, -18.5), (6.2, -17))
        make_face()
    extrude(amount=CUT_EXTRUDE7_DEPTH + CUT_EXTRUDE7_DEPTH_BACK, mode=Mode.SUBTRACT)


solid = part.part
